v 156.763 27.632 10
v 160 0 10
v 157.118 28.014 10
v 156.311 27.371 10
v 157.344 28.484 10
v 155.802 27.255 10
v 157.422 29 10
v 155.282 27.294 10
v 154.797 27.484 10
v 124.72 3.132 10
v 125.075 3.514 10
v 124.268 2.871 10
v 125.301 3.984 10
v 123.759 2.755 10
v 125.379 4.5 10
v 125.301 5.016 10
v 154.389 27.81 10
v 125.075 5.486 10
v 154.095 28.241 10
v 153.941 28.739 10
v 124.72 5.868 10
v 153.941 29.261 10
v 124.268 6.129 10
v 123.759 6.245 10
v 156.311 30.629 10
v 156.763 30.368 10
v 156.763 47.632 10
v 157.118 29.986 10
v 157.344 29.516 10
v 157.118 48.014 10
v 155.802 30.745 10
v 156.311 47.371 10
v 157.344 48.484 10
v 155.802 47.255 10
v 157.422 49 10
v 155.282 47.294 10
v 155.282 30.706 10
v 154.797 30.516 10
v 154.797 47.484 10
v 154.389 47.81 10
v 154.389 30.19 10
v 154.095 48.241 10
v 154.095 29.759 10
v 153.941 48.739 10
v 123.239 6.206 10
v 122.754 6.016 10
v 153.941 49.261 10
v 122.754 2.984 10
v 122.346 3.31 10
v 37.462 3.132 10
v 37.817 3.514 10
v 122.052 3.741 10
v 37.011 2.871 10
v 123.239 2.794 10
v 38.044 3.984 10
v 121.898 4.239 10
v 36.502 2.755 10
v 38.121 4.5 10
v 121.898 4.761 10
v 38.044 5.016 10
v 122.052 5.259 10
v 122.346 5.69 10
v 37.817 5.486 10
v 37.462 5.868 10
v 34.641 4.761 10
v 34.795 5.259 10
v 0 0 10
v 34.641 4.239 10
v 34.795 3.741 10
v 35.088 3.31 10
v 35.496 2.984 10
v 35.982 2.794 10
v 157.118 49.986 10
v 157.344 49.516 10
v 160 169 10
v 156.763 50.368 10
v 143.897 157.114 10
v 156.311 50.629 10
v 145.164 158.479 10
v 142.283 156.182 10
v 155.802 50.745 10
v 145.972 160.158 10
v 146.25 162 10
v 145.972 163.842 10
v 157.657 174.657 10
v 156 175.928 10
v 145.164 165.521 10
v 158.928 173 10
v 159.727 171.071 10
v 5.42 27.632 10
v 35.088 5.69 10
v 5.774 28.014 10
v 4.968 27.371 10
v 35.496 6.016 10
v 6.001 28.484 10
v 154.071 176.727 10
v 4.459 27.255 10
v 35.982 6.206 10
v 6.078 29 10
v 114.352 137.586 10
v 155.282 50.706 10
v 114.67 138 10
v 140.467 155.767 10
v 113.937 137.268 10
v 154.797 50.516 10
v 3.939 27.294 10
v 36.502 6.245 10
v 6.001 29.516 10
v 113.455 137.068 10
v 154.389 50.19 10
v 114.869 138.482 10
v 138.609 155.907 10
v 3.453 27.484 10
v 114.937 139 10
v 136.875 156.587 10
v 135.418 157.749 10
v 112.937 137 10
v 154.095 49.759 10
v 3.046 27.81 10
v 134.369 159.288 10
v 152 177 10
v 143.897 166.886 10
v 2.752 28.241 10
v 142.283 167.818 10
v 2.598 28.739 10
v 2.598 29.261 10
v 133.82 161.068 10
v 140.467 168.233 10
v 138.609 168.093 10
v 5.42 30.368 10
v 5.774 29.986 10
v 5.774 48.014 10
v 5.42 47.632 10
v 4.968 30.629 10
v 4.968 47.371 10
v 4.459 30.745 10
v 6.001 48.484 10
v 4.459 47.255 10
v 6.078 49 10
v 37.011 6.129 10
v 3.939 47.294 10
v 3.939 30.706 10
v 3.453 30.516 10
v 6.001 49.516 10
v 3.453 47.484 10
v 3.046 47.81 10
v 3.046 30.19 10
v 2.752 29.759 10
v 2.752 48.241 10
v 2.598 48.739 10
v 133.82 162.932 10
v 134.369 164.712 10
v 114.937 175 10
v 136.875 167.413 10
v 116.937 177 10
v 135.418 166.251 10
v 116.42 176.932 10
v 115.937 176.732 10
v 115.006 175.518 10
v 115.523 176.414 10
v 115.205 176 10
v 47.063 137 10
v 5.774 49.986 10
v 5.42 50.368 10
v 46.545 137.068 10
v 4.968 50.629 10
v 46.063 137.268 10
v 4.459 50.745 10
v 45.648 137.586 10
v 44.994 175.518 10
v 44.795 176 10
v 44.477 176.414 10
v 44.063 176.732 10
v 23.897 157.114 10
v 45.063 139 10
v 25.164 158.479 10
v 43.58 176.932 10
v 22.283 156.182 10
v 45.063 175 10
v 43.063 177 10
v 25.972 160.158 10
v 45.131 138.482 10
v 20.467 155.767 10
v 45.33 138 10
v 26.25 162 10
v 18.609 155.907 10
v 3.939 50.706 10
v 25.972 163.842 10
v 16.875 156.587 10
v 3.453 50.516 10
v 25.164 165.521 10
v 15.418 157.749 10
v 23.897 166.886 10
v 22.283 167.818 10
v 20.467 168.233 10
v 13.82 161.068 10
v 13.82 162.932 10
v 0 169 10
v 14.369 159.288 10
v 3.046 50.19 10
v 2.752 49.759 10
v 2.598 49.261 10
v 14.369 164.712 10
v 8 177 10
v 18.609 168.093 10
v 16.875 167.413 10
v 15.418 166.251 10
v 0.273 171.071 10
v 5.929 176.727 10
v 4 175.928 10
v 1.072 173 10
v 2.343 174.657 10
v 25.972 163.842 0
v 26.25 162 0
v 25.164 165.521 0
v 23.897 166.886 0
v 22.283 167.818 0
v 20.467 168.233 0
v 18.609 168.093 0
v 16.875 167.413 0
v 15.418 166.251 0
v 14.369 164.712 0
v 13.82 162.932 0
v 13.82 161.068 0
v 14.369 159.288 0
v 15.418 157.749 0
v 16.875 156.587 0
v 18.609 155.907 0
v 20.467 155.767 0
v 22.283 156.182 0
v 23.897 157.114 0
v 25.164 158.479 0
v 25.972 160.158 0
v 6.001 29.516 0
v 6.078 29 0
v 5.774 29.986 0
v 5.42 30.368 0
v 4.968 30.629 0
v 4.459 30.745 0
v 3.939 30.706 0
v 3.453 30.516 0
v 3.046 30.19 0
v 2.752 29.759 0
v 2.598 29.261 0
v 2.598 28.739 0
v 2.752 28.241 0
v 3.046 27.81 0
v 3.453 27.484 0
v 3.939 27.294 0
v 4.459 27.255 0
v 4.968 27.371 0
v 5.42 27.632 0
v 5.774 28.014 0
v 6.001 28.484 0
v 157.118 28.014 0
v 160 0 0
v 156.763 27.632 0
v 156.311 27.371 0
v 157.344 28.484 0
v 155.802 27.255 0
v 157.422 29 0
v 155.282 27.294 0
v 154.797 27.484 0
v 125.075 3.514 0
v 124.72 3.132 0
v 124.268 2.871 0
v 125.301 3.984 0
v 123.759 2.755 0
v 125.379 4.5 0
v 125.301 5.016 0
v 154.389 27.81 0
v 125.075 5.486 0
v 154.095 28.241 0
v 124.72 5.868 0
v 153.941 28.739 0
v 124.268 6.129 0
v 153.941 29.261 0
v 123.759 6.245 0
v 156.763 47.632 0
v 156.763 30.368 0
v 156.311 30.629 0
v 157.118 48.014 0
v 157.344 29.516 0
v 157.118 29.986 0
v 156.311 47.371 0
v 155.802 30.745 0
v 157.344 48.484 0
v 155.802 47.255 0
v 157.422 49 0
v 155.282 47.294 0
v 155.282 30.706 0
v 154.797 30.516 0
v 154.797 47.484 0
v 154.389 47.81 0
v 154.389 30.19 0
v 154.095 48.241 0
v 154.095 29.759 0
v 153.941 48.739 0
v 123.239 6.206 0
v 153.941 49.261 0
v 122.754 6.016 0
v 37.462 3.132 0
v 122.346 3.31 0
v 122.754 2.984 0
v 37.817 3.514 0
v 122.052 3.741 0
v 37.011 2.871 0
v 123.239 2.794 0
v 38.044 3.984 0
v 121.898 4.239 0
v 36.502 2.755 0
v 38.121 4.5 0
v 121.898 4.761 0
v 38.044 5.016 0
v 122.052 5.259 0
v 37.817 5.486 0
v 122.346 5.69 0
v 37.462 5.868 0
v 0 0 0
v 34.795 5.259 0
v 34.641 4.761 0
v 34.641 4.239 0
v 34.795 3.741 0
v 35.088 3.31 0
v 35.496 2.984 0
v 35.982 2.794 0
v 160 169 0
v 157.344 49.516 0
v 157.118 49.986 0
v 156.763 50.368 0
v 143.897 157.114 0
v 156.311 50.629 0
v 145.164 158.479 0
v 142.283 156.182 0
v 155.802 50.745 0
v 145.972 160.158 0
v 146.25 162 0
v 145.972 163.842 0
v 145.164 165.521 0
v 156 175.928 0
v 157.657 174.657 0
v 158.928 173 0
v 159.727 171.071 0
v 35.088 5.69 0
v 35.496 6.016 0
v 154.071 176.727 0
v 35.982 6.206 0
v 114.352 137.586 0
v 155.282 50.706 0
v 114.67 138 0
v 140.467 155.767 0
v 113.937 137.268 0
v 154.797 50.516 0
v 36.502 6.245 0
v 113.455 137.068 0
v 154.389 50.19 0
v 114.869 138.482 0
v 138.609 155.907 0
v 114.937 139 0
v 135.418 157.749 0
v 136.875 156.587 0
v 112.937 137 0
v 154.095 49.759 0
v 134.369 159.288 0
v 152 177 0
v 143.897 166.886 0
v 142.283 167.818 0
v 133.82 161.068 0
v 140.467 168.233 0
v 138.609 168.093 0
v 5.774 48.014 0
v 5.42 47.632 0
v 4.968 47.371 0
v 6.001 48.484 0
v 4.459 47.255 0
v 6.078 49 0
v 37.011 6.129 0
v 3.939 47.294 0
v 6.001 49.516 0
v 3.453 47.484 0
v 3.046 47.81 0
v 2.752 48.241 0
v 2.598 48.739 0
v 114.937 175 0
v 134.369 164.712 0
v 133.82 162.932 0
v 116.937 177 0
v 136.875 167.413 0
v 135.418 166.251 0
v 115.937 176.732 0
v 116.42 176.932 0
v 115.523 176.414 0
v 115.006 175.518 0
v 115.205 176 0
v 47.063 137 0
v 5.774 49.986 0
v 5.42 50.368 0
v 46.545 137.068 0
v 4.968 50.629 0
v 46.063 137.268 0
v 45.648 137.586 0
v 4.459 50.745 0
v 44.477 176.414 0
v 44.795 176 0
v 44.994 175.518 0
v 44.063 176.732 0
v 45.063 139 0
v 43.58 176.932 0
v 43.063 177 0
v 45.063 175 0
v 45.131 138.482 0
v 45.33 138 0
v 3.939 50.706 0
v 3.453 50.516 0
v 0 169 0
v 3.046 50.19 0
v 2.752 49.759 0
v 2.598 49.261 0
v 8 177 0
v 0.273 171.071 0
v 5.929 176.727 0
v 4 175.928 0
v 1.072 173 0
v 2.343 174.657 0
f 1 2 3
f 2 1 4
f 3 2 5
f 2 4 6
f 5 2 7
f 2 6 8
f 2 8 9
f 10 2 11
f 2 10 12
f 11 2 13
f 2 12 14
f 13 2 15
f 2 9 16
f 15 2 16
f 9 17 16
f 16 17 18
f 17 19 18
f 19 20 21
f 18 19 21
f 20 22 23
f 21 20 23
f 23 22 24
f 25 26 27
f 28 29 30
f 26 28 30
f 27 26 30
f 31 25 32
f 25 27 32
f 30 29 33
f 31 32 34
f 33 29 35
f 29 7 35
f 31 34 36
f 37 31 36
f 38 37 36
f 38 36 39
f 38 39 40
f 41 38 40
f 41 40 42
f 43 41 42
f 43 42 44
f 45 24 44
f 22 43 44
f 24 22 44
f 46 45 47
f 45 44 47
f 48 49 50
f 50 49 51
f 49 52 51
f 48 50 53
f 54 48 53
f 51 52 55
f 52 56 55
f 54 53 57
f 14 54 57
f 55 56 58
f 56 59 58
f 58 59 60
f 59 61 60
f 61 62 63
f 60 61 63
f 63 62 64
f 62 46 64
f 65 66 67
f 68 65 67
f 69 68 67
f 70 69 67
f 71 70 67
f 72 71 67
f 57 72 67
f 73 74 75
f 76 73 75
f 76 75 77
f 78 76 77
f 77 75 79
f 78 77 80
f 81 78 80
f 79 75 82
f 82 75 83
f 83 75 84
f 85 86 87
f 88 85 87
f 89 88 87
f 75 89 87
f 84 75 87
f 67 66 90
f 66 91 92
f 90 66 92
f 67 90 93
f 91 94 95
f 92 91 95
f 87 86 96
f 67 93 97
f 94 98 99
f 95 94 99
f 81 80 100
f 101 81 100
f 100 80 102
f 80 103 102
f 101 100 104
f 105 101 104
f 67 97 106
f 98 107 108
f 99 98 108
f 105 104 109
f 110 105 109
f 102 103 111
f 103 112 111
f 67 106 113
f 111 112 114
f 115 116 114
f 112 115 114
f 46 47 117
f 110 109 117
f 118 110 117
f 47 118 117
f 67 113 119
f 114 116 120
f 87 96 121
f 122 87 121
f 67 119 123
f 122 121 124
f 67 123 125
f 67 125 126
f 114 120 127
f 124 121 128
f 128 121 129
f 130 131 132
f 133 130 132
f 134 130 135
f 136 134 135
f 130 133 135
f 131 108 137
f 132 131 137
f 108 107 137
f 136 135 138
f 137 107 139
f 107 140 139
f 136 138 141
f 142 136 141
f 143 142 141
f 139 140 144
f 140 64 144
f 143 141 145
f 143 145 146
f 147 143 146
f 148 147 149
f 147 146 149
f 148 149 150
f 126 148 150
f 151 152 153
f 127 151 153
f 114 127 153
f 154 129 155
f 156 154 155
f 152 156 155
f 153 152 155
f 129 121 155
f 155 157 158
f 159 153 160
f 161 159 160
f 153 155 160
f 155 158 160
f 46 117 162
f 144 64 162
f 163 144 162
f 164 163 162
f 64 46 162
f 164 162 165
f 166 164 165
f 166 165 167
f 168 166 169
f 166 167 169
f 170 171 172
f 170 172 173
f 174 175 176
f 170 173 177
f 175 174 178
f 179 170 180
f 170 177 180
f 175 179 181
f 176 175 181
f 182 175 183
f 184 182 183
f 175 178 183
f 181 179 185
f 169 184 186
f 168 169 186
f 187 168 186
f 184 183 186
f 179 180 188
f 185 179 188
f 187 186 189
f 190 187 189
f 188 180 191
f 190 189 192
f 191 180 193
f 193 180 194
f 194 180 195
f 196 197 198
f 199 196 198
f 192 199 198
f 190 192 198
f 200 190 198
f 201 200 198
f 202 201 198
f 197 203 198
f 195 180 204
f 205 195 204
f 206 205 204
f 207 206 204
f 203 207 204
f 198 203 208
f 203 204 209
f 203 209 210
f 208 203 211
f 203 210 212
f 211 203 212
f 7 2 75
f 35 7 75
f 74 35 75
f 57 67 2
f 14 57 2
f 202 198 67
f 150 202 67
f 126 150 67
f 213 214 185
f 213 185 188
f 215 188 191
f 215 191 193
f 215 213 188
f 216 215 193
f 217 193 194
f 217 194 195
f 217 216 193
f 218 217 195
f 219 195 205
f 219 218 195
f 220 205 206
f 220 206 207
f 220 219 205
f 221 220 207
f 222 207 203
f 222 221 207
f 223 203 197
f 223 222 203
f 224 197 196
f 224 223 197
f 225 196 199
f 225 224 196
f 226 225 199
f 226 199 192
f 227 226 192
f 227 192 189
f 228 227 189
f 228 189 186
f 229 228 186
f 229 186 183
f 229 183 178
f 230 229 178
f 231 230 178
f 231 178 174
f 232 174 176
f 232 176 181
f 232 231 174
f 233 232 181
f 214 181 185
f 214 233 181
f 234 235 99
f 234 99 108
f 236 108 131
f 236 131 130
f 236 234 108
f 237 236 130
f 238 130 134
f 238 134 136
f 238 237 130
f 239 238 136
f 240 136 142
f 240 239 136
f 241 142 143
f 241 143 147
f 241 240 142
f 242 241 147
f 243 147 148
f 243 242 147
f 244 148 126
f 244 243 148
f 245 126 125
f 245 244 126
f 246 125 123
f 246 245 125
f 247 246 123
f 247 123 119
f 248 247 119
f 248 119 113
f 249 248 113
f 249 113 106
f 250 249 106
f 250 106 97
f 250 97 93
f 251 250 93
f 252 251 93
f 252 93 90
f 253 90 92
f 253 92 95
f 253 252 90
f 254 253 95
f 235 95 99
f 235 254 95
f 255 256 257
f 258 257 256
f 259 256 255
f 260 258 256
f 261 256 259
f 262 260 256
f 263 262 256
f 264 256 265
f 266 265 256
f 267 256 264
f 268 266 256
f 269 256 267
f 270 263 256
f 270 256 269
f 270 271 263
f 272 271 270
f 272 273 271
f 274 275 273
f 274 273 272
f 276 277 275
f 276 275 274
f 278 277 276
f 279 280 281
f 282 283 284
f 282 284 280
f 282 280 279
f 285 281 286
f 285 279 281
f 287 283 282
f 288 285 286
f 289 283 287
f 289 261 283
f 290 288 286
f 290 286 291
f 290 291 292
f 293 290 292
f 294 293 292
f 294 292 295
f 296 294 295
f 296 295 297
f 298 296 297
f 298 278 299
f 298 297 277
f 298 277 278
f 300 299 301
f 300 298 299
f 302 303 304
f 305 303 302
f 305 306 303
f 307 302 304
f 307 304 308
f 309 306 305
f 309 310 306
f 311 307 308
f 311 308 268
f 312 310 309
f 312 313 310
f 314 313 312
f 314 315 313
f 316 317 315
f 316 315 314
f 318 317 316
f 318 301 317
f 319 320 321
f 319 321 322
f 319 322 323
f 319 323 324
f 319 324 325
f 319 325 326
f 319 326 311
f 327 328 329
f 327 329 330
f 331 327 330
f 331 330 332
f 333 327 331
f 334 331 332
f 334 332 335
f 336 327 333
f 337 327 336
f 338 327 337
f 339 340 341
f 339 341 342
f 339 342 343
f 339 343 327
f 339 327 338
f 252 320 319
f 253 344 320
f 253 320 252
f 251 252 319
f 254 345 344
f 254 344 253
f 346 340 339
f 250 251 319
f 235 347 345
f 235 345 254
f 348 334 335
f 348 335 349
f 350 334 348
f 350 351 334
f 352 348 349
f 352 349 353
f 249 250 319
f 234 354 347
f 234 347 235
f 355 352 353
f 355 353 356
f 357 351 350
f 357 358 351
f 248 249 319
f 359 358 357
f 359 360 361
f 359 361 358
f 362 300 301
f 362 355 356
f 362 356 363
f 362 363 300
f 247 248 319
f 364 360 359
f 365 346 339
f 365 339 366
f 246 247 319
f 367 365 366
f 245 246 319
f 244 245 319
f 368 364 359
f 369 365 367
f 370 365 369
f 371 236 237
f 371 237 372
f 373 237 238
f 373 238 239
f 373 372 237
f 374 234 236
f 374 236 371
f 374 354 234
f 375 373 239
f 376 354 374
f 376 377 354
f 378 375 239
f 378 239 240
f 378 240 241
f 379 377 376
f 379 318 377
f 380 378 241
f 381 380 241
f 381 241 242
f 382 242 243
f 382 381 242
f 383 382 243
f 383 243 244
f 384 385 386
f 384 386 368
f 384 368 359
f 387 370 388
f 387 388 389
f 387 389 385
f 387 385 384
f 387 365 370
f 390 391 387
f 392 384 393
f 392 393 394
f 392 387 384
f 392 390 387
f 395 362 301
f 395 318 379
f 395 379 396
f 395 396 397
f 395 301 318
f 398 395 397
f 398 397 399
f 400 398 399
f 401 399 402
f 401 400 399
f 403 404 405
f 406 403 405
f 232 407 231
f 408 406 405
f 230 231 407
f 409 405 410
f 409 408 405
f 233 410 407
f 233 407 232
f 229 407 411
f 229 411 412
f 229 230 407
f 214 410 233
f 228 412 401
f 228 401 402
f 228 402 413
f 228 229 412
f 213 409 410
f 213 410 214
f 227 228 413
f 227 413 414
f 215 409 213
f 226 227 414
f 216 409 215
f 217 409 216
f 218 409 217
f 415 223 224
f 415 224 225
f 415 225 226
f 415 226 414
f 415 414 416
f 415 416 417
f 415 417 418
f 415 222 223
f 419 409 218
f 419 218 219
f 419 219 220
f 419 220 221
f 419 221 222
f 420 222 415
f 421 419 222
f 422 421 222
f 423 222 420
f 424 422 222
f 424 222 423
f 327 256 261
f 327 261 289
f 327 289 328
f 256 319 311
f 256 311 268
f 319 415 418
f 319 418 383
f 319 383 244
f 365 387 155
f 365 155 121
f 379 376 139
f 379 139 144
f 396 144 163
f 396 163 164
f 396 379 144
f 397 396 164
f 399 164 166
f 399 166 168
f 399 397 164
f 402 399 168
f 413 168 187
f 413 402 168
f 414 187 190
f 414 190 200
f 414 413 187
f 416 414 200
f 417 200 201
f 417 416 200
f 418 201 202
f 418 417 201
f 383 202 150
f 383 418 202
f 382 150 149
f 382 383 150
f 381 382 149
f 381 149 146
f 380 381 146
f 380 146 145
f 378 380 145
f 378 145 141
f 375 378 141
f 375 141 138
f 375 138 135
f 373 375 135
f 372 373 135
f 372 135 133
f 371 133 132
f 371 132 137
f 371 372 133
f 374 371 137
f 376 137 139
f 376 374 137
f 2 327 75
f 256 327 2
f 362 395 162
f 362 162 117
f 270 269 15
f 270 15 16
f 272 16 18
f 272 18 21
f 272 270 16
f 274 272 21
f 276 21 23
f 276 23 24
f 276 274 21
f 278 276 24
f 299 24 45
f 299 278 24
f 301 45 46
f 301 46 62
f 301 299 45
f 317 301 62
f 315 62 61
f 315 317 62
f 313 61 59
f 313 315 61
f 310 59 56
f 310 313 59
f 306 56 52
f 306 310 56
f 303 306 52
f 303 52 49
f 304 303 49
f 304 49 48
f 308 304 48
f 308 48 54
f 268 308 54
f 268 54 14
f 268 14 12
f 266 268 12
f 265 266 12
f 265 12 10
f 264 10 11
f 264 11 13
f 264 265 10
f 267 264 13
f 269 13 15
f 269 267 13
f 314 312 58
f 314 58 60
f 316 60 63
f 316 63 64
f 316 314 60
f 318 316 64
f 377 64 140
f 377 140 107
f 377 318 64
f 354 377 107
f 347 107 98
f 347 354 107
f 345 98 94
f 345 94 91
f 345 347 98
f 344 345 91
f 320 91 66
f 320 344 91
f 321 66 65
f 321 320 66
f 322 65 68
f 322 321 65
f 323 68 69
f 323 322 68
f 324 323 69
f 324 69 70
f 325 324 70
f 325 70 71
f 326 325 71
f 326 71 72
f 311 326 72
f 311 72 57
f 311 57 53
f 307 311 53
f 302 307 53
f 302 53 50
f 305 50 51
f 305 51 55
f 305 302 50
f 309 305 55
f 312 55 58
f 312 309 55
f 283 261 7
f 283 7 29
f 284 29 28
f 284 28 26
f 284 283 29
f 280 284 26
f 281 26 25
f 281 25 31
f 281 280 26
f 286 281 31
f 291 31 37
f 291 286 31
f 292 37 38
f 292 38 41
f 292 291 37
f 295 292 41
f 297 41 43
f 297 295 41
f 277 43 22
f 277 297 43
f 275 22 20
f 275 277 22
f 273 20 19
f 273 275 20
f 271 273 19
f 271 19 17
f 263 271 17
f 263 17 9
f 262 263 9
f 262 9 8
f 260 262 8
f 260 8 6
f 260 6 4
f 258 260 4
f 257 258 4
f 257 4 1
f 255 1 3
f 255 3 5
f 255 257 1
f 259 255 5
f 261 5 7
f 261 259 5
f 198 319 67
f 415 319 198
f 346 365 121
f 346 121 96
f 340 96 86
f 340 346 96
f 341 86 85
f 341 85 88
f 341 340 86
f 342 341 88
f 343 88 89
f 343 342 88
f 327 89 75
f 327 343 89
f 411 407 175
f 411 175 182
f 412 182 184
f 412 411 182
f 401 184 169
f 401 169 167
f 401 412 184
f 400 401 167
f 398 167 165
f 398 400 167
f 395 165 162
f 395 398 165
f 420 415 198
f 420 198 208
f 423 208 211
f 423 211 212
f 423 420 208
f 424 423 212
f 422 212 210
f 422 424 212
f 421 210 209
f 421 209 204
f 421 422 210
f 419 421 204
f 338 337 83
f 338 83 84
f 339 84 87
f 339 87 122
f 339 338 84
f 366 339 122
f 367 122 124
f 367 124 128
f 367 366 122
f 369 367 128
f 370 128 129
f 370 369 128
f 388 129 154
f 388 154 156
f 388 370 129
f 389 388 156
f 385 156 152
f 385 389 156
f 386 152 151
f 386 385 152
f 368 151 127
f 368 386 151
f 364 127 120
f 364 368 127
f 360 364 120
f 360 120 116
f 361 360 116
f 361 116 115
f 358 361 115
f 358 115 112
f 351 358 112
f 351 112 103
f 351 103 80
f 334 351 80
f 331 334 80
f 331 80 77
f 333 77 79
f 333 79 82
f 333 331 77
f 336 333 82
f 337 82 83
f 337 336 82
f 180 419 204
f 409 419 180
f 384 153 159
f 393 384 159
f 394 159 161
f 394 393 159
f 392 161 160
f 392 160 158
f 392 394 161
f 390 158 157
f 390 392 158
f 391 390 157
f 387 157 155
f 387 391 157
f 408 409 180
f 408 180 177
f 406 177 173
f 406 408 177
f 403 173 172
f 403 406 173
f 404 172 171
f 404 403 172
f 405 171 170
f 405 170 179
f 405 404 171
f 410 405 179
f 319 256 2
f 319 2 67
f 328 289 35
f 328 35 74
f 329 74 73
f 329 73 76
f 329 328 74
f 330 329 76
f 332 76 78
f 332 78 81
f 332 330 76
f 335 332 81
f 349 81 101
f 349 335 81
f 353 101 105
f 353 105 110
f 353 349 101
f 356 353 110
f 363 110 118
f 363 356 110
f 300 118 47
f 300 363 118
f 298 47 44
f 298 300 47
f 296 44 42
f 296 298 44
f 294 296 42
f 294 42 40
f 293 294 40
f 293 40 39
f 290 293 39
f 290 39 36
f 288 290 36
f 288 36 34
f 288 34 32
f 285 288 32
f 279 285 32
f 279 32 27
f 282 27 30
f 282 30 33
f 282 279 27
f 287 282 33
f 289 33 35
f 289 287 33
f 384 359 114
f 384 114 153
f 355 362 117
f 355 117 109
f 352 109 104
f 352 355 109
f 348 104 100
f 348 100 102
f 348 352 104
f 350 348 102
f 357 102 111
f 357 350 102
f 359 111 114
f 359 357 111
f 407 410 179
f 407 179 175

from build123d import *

# Parameters (mm, degrees)
SKETCH1_R           = 6.25
SKETCH1_R_2         = 1.75
BOSS_EXTRUDE1_DEPTH = 10


with BuildPart() as part:
    # Sketch1 → Boss-Extrude1 (new body)
    with BuildSketch(Plane.XY):
        with BuildLine():
            Line((40.062548905, 177), (43.062548905, 177))
            ThreePointArc((43.062548905, 177), (44.476762467, 176.414213562), (45.062548905, 175))
            Line((45.062548905, 175), (45.062548905, 139))
            ThreePointArc((45.062548905, 139), (45.648335342, 137.585786438), (47.062548905, 137))
            Line((47.062548905, 137), (112.937451095, 137))
            ThreePointArc((112.937451095, 137), (114.351664658, 137.585786438), (114.937451095, 139))
            Line((114.937451095, 139), (114.937451095, 175))
            ThreePointArc((114.937451095, 175), (115.523237533, 176.414213562), (116.937451095, 177))
            Line((116.937451095, 177), (120, 177))
            Line((120, 177), (152, 177))
            ThreePointArc((152, 177), (157.656854249, 174.656854249), (160, 169))
            Line((160, 169), (160, 0))
            Line((160, 0), (120, 0))
            Line((120, 0), (40, 0))
            Line((40, 0), (0, 0))
            Line((0, 0), (0, 169))
            ThreePointArc((0, 169), (2.343145751, 174.656854249), (8, 177))
            Line((8, 177), (40, 177))
            Line((40, 177), (40.062548905, 177))
        make_face()
        with Locations((20, 162)):
            Circle(SKETCH1_R, mode=Mode.SUBTRACT)
        with Locations((140, 162)):
            Circle(SKETCH1_R, mode=Mode.SUBTRACT)
        with Locations((4.328403696, 49)):
            Circle(SKETCH1_R_2, mode=Mode.SUBTRACT)
        with Locations((4.328403696, 29)):
            Circle(SKETCH1_R_2, mode=Mode.SUBTRACT)
        with Locations((36.371302772, 4.5)):
            Circle(SKETCH1_R_2, mode=Mode.SUBTRACT)
        with Locations((123.628697228, 4.5)):
            Circle(SKETCH1_R_2, mode=Mode.SUBTRACT)
        with Locations((155.671596304, 29)):
            Circle(SKETCH1_R_2, mode=Mode.SUBTRACT)
        with Locations((155.671596304, 49)):
            Circle(SKETCH1_R_2, mode=Mode.SUBTRACT)
    extrude(amount=BOSS_EXTRUDE1_DEPTH)


solid = part.part
